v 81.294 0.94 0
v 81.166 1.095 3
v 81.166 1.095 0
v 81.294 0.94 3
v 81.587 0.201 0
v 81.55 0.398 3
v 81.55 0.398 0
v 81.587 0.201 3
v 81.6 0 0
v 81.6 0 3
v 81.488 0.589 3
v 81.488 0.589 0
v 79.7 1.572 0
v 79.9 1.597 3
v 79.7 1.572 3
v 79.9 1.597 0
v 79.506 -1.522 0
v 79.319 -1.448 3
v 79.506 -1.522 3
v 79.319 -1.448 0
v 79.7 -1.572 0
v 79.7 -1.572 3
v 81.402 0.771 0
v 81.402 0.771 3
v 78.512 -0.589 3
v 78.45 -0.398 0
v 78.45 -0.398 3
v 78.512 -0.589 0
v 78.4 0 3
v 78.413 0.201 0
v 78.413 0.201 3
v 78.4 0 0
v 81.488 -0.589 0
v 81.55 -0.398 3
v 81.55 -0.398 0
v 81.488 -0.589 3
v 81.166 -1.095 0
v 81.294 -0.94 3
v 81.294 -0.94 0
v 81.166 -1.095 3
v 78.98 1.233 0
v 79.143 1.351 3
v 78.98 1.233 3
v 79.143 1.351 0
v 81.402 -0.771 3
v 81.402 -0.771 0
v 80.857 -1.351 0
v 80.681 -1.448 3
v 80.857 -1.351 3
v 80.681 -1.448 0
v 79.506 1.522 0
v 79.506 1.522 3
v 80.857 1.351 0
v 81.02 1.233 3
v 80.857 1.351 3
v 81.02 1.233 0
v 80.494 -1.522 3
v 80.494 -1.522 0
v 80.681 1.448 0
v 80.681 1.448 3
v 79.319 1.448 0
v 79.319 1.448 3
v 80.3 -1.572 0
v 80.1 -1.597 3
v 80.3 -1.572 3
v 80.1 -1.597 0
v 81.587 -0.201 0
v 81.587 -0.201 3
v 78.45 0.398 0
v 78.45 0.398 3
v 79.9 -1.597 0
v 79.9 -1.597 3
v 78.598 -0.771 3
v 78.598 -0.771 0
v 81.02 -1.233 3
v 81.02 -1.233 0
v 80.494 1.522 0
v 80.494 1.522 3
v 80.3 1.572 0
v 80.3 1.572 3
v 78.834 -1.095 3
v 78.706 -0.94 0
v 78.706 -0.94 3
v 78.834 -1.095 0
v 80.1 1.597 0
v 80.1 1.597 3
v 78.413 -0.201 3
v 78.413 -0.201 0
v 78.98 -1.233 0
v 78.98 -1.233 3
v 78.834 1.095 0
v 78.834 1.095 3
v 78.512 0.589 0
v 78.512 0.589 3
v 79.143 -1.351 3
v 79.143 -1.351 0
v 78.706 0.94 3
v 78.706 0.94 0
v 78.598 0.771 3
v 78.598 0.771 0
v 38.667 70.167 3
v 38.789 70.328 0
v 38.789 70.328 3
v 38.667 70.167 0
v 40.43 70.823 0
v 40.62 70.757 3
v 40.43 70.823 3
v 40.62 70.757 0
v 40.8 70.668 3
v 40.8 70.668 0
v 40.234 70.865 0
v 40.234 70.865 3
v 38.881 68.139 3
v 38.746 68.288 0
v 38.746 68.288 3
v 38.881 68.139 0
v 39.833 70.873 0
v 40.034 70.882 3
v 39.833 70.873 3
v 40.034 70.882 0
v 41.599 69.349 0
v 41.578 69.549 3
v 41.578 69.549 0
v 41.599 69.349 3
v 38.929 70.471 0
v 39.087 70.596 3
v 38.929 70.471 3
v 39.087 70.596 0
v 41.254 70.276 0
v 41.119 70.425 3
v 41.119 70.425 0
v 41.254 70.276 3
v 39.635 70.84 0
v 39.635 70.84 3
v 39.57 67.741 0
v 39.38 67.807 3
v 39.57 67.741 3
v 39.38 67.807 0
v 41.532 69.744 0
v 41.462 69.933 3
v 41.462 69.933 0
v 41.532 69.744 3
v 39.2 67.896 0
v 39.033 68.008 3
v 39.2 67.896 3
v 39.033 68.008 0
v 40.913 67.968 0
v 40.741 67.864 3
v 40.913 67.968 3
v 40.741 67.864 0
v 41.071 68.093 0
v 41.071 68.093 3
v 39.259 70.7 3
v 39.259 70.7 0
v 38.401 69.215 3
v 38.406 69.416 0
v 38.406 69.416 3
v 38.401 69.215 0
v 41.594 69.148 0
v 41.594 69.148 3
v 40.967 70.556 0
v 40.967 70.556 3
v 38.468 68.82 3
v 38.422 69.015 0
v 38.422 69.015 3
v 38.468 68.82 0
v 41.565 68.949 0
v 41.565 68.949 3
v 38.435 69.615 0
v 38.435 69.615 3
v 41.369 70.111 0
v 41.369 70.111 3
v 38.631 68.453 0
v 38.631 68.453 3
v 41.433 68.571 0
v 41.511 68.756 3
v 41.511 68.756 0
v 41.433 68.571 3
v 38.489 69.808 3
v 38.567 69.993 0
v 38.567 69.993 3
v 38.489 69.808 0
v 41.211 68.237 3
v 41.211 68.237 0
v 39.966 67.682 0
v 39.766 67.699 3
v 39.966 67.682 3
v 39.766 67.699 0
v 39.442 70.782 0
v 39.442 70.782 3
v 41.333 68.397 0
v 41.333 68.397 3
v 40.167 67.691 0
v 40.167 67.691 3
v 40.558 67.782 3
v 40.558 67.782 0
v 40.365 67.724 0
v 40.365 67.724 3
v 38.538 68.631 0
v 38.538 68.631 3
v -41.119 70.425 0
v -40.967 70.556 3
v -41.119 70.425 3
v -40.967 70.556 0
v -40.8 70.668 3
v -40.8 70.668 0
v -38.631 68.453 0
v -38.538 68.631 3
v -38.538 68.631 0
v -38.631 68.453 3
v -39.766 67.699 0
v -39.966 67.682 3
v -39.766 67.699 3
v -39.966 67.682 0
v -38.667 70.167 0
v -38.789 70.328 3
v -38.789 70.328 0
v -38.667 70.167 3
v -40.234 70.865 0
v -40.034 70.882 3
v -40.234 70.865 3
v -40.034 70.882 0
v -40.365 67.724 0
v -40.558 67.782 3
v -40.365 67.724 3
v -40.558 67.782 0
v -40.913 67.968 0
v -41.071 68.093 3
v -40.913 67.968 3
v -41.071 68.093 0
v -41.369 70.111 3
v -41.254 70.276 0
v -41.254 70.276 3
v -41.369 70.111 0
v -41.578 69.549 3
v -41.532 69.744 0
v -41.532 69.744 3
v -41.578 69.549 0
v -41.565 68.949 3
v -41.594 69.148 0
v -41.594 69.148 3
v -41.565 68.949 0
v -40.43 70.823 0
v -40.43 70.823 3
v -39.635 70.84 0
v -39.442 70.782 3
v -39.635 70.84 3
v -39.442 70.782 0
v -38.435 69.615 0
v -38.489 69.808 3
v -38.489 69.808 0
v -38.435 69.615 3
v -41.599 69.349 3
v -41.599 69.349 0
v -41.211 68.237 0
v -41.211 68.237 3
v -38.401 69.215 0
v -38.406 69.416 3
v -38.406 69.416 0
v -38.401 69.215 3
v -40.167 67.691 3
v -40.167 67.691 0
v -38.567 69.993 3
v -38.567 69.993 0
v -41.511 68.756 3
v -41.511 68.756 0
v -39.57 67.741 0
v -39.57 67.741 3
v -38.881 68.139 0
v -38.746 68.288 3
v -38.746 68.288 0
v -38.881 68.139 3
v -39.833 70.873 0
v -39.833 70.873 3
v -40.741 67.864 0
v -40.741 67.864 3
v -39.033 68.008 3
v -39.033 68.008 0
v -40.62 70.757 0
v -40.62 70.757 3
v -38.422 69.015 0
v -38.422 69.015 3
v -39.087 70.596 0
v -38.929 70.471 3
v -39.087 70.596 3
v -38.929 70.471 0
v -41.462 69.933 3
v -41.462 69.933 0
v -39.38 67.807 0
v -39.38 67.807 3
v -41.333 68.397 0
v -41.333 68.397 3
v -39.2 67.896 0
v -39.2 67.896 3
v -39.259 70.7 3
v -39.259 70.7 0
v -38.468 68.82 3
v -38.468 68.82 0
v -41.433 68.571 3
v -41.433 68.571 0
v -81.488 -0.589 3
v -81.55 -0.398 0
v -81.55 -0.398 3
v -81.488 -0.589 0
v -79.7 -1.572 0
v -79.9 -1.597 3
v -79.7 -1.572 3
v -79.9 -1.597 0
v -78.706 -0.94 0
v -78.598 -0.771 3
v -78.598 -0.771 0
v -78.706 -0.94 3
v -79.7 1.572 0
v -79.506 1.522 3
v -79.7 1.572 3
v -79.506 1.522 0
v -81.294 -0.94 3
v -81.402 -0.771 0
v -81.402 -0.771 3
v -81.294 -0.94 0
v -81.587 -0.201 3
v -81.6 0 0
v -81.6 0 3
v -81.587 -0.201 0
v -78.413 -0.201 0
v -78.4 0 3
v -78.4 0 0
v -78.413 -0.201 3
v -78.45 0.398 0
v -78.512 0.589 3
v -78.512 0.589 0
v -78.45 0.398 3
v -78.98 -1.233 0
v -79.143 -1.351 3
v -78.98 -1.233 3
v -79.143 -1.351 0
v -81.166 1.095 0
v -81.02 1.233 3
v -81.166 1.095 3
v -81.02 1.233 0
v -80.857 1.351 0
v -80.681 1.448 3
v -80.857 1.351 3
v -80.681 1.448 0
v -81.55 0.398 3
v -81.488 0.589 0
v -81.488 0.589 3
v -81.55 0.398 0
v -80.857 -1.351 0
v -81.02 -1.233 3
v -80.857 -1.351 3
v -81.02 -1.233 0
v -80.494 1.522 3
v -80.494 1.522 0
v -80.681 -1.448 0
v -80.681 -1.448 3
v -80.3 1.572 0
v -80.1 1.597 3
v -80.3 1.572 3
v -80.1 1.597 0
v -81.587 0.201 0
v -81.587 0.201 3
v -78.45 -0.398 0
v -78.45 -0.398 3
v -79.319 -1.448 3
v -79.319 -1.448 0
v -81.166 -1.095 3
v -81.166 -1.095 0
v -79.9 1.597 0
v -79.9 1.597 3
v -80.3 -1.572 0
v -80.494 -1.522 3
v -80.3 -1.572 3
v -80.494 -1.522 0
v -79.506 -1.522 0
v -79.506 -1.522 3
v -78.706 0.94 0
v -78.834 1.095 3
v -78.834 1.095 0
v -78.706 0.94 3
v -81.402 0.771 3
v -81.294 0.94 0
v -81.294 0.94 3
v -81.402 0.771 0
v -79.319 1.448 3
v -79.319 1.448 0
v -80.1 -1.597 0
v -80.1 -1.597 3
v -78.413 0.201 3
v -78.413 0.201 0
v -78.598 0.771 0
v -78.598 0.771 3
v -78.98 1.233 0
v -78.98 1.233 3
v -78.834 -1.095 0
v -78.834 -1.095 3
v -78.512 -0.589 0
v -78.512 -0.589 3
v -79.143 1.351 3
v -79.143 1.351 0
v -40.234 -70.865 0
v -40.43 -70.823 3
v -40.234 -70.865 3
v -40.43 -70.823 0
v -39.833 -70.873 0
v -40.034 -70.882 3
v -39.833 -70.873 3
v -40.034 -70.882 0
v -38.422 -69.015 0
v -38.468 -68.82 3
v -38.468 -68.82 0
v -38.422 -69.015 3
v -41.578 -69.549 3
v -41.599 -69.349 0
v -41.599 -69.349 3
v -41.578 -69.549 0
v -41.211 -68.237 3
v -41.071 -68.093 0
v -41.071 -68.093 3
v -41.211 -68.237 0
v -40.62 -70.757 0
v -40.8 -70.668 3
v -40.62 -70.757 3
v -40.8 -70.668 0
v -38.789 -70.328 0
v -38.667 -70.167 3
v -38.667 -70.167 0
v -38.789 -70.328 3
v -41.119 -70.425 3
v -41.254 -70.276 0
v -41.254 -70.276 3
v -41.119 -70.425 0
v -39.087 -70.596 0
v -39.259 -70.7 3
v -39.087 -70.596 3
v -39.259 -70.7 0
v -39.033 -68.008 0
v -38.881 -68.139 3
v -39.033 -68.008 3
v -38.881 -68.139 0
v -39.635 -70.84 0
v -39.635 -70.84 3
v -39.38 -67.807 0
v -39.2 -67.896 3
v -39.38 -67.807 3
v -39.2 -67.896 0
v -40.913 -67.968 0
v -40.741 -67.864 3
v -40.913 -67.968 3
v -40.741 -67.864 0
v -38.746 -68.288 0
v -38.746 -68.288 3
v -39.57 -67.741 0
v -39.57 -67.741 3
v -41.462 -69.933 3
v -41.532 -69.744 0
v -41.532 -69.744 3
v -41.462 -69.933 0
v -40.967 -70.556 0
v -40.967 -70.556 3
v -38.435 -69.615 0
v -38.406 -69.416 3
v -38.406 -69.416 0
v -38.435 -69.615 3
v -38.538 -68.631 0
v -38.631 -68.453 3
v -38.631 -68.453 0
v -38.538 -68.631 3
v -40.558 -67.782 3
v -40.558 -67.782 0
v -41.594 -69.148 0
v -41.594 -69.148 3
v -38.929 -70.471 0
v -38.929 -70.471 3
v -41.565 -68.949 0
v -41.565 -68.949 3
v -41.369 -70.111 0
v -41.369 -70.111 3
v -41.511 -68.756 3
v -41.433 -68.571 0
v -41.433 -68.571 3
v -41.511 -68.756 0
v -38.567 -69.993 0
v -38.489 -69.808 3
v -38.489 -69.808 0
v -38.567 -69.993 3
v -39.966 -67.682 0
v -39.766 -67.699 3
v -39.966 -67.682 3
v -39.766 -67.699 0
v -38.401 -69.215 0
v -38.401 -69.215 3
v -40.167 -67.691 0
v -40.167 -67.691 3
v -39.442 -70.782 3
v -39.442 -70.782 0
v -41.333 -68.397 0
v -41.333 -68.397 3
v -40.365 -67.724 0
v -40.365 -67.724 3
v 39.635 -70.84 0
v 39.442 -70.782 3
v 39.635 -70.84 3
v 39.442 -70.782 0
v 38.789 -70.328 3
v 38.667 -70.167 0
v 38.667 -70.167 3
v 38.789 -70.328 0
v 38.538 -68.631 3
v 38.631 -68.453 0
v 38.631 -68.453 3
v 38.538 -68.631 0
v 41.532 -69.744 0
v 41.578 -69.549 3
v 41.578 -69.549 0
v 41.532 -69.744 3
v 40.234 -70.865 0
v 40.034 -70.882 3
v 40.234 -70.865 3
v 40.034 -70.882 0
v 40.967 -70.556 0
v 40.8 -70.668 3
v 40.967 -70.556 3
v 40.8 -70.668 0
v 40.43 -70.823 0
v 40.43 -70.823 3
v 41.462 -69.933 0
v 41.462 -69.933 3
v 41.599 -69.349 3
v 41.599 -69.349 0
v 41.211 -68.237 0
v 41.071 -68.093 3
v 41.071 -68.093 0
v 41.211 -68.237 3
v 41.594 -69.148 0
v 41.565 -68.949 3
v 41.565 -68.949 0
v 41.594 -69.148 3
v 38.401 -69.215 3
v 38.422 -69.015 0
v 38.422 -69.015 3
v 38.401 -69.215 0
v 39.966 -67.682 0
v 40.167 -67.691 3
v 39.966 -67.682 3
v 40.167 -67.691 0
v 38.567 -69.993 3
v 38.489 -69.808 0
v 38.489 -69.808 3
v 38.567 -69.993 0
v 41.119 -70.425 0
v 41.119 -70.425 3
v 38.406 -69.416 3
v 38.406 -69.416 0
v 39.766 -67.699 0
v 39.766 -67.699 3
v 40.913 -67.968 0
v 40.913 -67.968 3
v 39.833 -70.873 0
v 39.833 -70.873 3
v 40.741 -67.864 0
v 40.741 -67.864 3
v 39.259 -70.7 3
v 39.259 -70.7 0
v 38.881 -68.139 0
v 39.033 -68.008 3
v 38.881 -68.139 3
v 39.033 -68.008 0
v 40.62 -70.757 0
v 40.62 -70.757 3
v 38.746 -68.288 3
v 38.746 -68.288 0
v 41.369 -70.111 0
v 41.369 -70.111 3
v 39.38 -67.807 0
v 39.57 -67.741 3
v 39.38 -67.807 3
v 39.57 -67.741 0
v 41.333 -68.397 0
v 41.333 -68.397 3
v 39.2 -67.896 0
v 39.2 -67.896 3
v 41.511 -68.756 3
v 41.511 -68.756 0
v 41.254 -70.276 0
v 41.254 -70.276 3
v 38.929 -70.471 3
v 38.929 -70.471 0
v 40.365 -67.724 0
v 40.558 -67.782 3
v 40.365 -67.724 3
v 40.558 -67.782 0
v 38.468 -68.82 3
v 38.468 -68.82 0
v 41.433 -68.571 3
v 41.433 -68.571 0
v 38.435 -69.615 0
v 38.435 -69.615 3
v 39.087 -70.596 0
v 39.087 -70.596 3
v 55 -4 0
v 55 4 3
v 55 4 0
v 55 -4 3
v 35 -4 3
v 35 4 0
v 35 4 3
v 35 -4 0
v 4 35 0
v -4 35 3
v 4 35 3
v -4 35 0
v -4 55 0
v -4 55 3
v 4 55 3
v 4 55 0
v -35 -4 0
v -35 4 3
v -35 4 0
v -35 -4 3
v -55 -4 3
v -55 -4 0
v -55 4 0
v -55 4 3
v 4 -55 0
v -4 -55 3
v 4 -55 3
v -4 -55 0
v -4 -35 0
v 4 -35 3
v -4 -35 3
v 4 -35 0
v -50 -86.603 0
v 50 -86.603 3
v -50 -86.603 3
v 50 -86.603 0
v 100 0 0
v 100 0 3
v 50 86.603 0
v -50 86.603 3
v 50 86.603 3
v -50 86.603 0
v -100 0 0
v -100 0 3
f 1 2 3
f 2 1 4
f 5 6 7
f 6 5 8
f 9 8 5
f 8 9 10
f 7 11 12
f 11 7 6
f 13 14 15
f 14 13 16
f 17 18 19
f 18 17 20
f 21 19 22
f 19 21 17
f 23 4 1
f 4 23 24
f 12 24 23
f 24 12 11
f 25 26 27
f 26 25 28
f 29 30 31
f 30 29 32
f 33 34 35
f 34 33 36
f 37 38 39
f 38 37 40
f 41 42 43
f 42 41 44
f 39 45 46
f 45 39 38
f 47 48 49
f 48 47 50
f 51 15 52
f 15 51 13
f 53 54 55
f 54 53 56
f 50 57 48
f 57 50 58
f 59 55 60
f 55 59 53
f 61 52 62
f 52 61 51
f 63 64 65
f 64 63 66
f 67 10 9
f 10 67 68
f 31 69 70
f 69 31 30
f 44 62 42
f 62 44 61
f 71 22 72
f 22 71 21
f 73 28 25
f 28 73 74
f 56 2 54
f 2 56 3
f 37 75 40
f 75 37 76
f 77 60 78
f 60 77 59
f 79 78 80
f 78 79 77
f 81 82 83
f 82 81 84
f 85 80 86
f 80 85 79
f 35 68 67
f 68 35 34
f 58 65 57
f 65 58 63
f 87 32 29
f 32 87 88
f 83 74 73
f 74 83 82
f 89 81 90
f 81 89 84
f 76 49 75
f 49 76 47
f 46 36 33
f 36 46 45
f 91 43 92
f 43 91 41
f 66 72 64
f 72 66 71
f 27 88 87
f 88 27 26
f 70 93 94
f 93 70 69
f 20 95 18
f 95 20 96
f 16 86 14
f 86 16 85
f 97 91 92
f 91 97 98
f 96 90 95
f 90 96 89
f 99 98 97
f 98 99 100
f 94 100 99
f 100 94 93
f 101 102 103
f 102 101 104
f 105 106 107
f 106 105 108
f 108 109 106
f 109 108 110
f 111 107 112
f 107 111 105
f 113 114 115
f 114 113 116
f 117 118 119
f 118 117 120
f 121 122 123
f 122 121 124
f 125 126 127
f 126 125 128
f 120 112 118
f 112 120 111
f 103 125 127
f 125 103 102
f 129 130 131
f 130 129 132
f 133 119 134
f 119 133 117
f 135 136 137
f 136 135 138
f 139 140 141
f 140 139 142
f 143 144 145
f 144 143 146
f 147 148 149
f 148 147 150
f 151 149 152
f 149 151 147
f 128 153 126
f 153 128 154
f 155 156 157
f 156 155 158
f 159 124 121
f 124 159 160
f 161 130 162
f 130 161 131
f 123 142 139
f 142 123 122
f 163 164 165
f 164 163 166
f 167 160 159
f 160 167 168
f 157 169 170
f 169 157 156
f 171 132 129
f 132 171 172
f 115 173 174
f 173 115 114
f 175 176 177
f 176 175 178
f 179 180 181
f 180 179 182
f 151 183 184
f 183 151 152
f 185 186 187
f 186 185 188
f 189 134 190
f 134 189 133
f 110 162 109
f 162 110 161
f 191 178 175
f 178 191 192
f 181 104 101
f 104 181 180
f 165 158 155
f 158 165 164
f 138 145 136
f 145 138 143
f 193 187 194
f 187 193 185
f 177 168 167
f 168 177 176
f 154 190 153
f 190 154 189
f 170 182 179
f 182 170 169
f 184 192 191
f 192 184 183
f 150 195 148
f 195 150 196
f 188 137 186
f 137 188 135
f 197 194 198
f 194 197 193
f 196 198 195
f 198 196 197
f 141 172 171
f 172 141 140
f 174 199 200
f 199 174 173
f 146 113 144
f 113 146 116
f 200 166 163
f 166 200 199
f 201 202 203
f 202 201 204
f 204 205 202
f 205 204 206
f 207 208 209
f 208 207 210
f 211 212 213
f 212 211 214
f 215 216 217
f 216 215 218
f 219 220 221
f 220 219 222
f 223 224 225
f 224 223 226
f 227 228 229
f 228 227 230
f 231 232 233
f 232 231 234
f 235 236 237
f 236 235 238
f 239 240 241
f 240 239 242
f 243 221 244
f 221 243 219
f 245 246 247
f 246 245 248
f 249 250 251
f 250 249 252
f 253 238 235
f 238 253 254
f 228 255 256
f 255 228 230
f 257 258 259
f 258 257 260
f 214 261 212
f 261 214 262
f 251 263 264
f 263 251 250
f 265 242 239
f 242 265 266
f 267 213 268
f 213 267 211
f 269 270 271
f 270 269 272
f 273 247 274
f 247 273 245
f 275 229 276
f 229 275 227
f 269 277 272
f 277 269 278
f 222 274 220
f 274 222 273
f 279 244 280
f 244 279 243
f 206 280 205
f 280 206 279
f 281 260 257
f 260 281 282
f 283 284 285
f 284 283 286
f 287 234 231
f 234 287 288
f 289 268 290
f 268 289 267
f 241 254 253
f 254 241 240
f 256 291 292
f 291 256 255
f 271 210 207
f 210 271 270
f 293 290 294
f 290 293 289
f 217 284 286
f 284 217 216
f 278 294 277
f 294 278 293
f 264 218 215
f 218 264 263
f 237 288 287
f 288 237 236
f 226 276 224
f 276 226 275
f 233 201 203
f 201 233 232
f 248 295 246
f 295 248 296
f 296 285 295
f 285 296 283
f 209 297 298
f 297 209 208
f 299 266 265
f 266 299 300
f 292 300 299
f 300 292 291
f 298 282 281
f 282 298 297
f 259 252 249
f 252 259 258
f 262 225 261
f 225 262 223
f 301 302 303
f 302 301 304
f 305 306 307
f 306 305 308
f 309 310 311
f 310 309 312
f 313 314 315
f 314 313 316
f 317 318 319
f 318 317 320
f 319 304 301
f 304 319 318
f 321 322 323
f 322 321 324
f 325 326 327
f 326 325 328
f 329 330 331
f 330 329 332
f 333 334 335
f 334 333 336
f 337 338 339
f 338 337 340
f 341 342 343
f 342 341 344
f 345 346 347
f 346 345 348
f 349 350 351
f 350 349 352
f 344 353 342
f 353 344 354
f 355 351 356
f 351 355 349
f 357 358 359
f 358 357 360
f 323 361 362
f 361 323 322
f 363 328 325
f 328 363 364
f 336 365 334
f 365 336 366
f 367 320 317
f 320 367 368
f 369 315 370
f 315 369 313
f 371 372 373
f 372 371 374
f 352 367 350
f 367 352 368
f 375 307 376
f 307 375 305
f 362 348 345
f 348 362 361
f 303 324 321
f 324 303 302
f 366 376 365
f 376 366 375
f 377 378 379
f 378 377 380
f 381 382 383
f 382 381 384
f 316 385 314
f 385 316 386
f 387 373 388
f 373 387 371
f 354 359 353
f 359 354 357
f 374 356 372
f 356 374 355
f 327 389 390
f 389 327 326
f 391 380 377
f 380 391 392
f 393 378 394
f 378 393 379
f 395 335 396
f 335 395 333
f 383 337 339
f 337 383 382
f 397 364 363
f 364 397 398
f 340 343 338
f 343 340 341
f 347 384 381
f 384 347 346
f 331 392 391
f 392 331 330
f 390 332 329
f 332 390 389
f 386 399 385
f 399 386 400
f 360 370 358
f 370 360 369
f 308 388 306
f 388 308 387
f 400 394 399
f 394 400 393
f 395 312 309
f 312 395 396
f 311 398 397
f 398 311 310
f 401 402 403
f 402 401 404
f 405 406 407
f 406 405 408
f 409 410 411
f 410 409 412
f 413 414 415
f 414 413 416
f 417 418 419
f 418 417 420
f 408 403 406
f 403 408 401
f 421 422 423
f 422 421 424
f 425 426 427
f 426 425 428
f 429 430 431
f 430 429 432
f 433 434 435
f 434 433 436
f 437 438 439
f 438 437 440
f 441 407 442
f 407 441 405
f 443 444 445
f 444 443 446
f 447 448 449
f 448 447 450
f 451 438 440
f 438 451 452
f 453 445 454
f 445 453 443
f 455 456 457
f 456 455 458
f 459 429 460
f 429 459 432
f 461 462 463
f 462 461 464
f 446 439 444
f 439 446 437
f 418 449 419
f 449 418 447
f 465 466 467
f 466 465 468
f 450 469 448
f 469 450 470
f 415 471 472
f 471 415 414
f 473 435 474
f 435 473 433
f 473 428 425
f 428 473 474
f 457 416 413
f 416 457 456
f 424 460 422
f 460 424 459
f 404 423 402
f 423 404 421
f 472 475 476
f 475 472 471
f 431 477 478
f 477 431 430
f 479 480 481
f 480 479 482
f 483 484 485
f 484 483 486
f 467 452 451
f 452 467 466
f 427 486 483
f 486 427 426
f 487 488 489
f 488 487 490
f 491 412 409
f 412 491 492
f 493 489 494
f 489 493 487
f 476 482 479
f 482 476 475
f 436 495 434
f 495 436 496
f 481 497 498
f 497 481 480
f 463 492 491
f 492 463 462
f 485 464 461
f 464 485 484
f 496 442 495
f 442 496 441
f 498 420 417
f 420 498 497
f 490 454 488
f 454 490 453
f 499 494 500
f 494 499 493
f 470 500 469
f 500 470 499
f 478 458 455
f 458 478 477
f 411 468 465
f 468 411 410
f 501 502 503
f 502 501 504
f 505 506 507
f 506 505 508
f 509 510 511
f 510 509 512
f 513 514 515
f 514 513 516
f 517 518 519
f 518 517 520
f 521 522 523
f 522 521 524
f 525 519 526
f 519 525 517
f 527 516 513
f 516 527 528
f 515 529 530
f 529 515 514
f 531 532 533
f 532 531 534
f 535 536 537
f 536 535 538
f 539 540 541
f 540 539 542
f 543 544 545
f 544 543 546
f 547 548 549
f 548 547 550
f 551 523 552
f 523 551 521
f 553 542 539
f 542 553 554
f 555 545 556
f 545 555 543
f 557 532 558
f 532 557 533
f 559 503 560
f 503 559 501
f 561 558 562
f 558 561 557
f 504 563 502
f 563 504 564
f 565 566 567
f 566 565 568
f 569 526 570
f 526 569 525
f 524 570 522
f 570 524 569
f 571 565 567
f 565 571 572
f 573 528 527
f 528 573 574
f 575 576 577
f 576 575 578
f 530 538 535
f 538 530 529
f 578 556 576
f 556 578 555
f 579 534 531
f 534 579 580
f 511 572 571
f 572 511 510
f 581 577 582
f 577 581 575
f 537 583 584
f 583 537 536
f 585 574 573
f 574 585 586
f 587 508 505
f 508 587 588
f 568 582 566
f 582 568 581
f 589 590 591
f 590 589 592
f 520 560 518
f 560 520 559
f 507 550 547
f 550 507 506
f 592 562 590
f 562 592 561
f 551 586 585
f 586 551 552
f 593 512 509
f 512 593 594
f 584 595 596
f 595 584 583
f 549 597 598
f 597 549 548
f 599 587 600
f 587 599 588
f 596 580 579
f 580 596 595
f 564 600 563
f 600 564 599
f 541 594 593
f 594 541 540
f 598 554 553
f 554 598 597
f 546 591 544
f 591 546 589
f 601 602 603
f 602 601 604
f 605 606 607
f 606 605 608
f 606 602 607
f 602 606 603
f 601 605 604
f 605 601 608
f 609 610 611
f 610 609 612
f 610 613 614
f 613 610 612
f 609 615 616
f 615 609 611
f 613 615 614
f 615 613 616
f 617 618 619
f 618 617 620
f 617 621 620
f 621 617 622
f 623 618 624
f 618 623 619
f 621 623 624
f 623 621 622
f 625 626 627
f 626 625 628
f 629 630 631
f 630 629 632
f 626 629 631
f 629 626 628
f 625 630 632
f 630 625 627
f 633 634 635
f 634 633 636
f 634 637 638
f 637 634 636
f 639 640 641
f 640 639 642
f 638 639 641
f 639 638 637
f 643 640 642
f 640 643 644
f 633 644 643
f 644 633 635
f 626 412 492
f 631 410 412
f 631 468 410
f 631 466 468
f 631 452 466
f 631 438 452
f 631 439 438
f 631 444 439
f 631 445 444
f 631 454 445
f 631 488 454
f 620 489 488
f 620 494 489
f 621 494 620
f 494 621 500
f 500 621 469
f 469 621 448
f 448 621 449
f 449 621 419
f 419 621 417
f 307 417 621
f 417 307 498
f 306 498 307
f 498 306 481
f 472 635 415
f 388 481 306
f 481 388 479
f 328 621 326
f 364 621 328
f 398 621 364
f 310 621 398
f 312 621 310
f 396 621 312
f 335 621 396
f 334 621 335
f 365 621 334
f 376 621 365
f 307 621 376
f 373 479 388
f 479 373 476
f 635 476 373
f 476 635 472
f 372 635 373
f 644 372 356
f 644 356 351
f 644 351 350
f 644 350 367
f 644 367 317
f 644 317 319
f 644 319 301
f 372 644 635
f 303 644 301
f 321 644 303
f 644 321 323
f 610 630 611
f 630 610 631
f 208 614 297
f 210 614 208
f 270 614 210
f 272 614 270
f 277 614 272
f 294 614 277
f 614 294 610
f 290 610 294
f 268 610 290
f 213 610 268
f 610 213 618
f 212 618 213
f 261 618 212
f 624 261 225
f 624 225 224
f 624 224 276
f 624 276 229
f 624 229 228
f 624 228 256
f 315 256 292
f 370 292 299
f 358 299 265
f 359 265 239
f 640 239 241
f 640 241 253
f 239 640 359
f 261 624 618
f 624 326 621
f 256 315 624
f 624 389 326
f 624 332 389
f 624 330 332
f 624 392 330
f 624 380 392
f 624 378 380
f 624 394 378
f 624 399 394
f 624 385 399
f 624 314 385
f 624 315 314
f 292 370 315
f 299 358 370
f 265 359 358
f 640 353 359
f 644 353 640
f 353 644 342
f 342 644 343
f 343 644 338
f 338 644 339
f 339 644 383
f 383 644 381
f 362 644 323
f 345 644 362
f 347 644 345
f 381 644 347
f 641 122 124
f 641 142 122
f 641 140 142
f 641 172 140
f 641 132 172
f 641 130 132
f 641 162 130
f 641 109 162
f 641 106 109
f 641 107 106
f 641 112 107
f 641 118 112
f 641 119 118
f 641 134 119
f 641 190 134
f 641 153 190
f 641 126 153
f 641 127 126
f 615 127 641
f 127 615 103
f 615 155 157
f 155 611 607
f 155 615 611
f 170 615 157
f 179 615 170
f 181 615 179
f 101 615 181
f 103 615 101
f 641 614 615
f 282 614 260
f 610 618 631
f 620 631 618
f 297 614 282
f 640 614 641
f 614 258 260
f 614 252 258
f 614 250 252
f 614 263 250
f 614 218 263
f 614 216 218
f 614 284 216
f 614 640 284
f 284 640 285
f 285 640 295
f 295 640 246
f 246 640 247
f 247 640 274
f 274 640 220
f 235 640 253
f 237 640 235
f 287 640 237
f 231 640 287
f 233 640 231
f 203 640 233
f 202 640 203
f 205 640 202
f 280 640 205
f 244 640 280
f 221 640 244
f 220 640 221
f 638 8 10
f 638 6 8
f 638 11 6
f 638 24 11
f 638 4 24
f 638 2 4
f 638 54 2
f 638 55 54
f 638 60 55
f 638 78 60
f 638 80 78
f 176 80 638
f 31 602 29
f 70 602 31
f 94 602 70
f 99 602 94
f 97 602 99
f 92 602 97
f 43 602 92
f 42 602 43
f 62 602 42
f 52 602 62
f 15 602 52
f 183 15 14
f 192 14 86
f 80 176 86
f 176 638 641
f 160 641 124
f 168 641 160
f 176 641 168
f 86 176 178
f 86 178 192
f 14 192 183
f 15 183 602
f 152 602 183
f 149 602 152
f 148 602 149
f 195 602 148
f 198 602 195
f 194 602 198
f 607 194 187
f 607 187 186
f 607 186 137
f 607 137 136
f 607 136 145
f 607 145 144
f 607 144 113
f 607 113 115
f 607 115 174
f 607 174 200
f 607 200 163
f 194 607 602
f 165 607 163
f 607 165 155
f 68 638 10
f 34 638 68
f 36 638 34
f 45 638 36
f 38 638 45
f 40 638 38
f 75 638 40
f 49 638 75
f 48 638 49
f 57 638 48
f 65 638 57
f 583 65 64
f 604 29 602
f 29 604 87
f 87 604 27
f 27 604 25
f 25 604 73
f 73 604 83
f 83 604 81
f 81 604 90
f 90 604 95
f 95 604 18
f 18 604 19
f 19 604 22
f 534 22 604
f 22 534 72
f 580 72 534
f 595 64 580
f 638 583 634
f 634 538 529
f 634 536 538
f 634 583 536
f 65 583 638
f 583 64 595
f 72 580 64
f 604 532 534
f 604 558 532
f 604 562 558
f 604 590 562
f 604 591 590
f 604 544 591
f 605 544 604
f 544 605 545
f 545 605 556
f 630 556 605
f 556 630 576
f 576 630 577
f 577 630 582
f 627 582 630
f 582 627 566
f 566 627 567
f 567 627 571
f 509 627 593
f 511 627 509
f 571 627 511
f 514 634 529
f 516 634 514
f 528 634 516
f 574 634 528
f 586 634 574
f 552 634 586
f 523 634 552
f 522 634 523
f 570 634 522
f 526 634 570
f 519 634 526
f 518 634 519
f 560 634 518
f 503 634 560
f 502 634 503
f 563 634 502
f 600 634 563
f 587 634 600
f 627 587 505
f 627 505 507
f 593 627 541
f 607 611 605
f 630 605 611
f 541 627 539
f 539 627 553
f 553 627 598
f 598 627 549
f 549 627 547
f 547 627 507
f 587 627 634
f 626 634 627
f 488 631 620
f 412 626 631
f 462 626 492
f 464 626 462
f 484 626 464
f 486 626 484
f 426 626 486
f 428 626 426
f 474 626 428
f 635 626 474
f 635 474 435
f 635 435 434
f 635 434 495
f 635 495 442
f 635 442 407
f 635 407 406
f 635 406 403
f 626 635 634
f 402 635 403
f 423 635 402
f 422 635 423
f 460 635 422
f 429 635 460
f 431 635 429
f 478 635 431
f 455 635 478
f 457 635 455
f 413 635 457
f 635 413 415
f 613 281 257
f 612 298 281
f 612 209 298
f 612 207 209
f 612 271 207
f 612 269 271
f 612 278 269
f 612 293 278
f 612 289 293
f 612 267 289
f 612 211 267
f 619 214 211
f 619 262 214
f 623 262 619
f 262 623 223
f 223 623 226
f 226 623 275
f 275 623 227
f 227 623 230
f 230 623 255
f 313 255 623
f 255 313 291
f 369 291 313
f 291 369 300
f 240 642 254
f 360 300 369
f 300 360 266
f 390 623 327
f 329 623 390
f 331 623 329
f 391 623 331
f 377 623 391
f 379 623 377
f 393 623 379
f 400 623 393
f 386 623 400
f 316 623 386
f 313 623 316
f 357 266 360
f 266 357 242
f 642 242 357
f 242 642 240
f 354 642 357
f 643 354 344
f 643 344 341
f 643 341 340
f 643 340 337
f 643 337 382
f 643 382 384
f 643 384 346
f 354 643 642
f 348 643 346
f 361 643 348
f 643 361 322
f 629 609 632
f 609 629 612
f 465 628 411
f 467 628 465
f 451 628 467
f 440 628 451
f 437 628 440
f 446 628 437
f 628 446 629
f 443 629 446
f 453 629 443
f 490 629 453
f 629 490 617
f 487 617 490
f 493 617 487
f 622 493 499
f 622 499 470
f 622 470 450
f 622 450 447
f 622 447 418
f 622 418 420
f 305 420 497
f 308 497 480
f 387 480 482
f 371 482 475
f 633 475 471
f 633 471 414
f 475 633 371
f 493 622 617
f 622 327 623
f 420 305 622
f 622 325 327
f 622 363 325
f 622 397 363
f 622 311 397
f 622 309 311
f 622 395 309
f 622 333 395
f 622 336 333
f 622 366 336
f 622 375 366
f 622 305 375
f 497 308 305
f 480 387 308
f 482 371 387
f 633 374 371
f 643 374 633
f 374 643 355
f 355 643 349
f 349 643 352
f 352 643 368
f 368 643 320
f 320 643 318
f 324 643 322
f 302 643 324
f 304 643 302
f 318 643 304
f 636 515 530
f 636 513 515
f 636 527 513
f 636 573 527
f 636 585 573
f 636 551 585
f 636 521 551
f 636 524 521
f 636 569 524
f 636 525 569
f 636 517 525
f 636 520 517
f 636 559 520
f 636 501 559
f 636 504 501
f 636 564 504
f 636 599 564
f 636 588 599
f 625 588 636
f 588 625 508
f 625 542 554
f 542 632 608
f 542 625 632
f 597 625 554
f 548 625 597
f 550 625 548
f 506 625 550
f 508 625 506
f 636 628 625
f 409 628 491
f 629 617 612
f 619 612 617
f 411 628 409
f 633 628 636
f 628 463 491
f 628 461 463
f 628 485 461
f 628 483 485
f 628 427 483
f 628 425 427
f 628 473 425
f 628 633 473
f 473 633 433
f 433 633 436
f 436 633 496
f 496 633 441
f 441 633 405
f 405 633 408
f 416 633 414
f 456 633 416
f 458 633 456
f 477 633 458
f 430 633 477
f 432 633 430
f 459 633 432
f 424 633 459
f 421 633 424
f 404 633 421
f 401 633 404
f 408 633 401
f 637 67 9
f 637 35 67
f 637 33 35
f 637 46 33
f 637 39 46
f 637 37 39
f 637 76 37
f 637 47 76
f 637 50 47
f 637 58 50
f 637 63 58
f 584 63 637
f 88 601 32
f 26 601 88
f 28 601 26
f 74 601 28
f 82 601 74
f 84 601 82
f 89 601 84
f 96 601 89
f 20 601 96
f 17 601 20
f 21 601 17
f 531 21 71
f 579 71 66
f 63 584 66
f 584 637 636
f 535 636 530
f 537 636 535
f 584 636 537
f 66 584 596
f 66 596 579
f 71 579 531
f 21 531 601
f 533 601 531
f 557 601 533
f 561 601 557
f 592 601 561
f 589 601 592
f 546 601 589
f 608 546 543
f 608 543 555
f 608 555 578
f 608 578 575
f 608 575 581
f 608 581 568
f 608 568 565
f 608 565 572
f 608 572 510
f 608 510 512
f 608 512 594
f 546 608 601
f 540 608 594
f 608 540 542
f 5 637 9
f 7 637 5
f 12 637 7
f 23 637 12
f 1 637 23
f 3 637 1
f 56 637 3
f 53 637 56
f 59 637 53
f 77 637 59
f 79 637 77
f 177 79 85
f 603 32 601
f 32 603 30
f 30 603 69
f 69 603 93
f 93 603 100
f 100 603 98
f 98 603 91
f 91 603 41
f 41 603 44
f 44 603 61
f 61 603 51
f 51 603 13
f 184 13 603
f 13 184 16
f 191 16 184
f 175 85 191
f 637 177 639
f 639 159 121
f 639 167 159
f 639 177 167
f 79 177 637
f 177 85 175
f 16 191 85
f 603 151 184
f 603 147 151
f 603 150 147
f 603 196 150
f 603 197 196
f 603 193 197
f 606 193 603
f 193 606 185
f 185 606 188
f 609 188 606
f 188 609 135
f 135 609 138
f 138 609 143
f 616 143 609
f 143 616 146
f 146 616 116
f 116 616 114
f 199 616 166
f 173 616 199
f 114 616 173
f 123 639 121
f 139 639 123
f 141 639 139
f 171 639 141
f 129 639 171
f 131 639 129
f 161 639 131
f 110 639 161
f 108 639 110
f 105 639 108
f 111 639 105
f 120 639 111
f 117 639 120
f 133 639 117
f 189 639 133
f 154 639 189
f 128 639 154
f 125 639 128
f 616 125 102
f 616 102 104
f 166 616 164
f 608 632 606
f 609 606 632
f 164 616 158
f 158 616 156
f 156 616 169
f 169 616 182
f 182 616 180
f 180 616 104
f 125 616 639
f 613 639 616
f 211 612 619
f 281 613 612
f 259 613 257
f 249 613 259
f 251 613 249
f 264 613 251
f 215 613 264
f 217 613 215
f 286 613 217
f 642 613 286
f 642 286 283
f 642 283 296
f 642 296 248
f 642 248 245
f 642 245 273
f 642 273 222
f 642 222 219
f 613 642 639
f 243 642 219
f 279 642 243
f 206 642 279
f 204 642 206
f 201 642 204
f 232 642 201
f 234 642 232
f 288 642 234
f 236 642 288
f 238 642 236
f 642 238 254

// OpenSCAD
// file: parameters.scad
rotor_diameter = 250;
arm_n = 6;
drone_diameter = (rotor_diameter/sin(180/arm_n));

global_clearence = 0.1;


// M3 parameters =========================================
M3_screw_diameter = 3.2;
M3_nut_height = 2.7;
M3_nut_diameter = 6.6;
M3_nut_pocket = 5.6;

// 3D printer para. ======================================
print_plate_x = 220;
print_plate_y = 220;


// motor parameters ======================================
motor_diameter = 40;
motor_height = 18;
motor_n_screws = 4;
motor_screws_diameter = 20;


// motor holder para. (666_1001) =========================
motor_plate_height = 7;
motor_plate_diameter = motor_diameter;
motor_plate_hole_diameter = 10;
motor_tube_x_offset = motor_diameter/2 - 5;
motor_tube_z_offset = 20;

screws_n = 2;
screws_gap = 15;
screws_offset_x = 7.5;
screws_offset_y = 5;
holding_part_x = 30;
upper_holding_part_height = 15;
washer_size_x = 10;


// avionics plate para. (666_1003) =======================
avionics_plate_diameter = 200;
avionics_plate_height = 3;
avionics_plate_z_offset = 25;

av_screws_diameter = 160;
av_cable_holes_offset = 70;
av_cable_holes_width = 8;
av_cable_holes_length = 20;


// main base para. (666_1004) ============================
base_diameter = 200;
base_height = 30;
base_bottom_height = base_height/2;
base_arm_screw_x_offset = 5;

base_low_diameter = base_diameter/(2*tan(180/arm_n));
base_arm_washer_width = 10;


// arm pipe para. (888_1002) =============================
arm_pipe_diameter = 20;
arm_pipe_inner_diameter = 18;
arm_pipe_x_offset = 0;
arm_pipe_z_offset = 5;
arm_pipe_length = drone_diameter-motor_tube_x_offset-arm_pipe_x_offset;
// main file
include <parameters.scad>;

module 666_1003(draft) {
    difference(){
        cylinder(avionics_plate_height, d=avionics_plate_diameter, $fn = arm_n);
        
        // screws to base
        for (i = [0:360/arm_n:360-(360/arm_n)]) {
            rotate([0,0,i])
            translate([av_screws_diameter/2,0,-1])
            cylinder(avionics_plate_height+2,d=M3_screw_diameter, $fn = draft ? 10 : 50);
        }
        
        // holes for cables
        for (i = [0:90:360]) {
            rotate([0,0,i])
            translate([av_cable_holes_offset/2,-av_cable_holes_width/2,-1])
            cube([av_cable_holes_length,av_cable_holes_width,avionics_plate_height+2]);
        }
    }
}

666_1003();
